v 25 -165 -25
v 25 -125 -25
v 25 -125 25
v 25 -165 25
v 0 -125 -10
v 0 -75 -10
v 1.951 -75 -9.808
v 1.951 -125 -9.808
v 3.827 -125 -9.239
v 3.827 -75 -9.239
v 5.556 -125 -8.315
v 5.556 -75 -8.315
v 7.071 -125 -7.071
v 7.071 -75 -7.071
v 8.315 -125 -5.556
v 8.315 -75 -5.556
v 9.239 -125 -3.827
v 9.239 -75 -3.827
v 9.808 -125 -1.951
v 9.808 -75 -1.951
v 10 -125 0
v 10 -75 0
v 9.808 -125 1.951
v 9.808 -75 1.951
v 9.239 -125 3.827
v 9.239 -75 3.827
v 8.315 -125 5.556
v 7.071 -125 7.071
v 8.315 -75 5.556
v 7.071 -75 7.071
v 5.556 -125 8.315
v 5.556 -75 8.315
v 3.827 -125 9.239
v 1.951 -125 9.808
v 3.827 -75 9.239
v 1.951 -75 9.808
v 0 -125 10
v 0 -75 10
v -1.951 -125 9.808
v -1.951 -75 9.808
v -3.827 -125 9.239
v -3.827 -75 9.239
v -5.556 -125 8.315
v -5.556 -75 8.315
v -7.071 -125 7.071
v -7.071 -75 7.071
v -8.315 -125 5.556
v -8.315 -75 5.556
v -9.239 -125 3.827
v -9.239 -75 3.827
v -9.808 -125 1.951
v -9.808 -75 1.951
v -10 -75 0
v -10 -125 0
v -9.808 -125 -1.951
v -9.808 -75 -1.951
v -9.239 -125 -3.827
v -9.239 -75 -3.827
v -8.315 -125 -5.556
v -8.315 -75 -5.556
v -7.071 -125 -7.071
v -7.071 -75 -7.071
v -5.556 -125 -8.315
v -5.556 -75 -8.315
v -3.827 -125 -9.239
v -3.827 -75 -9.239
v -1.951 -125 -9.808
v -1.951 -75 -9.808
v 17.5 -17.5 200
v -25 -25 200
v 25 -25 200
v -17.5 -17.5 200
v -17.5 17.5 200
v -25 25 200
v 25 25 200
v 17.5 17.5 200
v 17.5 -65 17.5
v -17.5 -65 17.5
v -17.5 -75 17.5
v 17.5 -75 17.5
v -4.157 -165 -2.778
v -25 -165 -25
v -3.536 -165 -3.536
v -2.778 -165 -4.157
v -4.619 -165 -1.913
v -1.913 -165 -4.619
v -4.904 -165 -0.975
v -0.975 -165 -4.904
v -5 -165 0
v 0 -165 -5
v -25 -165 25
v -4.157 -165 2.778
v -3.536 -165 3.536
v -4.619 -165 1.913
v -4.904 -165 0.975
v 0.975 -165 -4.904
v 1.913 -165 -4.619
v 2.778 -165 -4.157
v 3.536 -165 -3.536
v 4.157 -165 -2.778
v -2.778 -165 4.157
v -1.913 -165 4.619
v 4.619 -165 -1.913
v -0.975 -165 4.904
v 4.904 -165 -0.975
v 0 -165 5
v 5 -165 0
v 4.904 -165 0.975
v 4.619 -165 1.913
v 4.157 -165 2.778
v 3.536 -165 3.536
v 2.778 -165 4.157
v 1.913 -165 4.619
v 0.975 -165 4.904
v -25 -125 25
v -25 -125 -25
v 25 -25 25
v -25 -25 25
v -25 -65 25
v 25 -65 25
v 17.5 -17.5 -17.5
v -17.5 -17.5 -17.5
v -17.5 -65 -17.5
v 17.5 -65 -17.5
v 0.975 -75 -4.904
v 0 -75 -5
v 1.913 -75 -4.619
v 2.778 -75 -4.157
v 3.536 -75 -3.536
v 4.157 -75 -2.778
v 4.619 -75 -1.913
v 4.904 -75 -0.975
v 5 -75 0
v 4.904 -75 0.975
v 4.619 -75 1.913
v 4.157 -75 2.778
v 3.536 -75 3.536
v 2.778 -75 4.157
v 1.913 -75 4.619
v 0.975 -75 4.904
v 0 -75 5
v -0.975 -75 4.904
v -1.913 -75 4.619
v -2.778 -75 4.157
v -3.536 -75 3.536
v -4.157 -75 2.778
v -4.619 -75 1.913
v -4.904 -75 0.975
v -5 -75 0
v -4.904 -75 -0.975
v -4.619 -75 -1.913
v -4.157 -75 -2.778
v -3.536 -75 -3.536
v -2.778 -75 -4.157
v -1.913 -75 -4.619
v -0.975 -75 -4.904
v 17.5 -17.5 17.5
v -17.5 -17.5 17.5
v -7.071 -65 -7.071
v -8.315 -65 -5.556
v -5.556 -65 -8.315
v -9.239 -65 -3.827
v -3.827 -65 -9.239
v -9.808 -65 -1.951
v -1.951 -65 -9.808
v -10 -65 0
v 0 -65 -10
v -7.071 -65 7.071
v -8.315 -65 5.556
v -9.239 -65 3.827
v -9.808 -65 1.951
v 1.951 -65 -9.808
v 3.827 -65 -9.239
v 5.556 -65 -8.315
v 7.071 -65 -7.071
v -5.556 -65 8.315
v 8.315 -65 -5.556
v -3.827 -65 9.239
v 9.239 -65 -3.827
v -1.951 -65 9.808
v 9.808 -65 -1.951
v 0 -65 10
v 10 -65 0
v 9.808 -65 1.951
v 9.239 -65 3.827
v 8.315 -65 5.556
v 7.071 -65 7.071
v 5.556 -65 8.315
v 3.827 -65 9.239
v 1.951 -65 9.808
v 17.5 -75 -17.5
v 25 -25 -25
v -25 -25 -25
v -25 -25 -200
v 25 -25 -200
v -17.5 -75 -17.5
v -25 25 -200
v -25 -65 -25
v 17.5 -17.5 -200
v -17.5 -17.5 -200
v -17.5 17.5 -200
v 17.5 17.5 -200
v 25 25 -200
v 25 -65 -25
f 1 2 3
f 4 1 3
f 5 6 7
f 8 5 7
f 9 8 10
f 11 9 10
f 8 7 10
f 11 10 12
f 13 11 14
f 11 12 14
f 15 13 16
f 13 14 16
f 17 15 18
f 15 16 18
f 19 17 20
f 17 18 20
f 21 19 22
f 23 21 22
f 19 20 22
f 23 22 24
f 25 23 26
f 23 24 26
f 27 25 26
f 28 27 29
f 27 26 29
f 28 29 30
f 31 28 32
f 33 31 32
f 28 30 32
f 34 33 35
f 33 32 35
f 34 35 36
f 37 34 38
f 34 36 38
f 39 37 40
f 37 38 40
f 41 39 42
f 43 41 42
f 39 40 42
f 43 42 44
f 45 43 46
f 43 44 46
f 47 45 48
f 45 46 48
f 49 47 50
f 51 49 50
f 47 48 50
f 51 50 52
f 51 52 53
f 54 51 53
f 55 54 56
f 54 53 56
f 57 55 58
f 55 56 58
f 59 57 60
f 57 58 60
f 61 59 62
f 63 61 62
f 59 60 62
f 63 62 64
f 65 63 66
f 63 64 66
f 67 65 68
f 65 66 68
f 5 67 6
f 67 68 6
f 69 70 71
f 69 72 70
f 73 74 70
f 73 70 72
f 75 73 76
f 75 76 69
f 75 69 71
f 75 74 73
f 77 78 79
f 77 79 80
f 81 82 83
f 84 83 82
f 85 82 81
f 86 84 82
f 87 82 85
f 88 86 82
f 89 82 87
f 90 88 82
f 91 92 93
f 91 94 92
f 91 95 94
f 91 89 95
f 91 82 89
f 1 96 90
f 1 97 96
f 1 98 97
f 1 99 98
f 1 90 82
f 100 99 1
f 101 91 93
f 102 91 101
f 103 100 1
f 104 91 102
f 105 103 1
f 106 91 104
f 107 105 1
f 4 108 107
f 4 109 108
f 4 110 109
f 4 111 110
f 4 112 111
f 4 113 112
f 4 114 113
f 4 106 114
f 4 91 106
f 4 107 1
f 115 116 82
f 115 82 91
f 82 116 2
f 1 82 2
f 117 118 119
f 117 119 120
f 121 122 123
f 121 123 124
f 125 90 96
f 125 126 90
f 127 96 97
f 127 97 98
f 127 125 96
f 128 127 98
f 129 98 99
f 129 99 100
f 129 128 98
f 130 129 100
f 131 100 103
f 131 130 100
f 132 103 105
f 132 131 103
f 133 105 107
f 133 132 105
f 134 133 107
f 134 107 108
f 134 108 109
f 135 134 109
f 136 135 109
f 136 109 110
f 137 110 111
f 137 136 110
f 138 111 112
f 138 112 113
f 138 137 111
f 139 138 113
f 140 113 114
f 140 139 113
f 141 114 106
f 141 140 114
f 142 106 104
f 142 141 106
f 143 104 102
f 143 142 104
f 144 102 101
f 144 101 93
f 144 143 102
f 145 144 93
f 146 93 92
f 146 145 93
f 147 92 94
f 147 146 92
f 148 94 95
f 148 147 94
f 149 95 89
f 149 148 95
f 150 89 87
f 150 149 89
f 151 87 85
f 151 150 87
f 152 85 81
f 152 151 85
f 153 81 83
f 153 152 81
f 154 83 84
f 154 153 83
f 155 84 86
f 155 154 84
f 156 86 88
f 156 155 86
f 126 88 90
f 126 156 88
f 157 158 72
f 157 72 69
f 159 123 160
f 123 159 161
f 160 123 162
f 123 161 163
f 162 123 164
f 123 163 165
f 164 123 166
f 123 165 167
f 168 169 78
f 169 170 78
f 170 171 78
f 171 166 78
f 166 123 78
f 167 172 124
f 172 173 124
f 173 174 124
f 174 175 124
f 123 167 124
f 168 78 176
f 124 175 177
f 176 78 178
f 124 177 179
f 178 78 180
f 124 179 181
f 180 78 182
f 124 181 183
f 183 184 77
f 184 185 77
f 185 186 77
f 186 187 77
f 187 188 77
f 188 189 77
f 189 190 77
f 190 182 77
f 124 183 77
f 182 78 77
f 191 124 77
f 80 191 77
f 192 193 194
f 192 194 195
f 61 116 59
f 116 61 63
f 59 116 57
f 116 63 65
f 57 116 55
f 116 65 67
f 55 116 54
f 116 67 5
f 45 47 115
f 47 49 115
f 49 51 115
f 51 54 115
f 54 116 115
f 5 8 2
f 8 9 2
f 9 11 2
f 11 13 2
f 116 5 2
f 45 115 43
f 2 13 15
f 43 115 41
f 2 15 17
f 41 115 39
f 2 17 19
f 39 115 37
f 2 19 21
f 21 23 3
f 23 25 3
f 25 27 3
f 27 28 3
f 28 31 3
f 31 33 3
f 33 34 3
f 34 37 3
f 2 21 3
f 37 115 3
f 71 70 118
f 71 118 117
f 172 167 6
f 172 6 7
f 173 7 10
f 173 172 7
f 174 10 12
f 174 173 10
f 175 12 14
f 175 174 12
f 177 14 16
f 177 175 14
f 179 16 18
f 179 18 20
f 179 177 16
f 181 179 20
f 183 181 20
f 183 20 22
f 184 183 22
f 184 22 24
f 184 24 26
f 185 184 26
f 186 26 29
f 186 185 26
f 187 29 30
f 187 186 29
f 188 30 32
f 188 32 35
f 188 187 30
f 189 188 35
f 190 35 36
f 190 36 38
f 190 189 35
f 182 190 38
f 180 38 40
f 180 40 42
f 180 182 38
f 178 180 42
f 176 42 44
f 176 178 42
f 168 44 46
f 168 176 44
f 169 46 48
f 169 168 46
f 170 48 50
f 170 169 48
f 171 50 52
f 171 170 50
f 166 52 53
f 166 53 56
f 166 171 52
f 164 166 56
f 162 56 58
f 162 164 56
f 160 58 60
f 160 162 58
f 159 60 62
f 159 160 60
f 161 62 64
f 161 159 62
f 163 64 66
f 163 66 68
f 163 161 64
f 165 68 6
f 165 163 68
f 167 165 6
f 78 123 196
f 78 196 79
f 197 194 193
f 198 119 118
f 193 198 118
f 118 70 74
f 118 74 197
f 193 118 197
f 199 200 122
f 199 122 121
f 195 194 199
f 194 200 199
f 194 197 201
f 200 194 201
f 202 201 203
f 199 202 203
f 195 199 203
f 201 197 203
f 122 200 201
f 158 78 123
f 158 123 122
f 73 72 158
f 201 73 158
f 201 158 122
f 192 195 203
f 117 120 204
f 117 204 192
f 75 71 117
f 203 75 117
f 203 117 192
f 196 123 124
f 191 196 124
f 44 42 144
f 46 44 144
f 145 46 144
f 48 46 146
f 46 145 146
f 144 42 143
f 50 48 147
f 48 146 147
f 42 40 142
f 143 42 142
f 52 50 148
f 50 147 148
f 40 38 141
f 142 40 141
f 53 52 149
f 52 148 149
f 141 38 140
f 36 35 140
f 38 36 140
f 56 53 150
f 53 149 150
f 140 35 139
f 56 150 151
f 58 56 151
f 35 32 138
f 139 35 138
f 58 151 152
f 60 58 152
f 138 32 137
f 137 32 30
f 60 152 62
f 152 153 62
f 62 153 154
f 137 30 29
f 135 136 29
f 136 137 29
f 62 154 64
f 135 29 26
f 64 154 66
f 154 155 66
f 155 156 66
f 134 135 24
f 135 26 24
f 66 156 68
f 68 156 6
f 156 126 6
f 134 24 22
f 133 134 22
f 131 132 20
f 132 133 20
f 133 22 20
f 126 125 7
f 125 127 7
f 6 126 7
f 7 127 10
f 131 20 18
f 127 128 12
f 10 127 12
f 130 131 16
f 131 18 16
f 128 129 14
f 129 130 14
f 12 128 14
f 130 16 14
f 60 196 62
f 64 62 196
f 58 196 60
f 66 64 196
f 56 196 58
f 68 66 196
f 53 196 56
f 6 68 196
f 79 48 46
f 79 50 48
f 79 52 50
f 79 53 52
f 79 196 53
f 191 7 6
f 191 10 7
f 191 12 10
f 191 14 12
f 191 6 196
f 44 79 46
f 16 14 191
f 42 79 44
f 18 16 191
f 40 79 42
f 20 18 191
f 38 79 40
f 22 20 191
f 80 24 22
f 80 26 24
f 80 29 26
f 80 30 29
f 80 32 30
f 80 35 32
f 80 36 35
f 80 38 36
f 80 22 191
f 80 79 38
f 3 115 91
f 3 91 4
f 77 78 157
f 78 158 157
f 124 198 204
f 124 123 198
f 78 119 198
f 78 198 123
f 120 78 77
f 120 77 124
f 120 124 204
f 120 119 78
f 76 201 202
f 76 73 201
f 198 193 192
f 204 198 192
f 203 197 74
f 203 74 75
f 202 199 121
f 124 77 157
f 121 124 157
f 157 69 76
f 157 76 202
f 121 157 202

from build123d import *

# Parameters (mm, degrees)
SKETCH_1_W          = 50
SKETCH_1_H          = 50
SKETCH_1_W_2        = 35
SKETCH_1_H_2        = 35
EXTRUDE_1_DEPTH     = 200
SKETCH_2_W          = 50
SKETCH_2_H          = 50
SKETCH_2_W_2        = 35
SKETCH_2_H_2        = 35
EXTRUDE_2_DEPTH     = 40
SKETCH_3_W          = 35
SKETCH_3_H          = 35
CUT_EXTRUDE_1_DEPTH = 60
SKETCH_4_W          = 35
SKETCH_4_H          = 35
SKETCH_4_R          = 10
EXTRUDE_3_DEPTH     = 10
SKETCH_5_R          = 10
SKETCH_5_R_2        = 5
EXTRUDE_4_DEPTH     = 50
SKETCH_6_W          = 50
SKETCH_6_H          = 50
SKETCH_6_R          = 5
EXTRUDE_5_DEPTH     = 40


with BuildPart() as part:
    # Эскиз1 → Бобышка-Вытянуть1 (new, symmetric)
    with BuildSketch(Plane.XY):
        Rectangle(SKETCH_1_W, SKETCH_1_H)
        Rectangle(SKETCH_1_W_2, SKETCH_1_H_2, mode=Mode.SUBTRACT)
    extrude(amount=EXTRUDE_1_DEPTH, both=True)

    # Эскиз2 → Бобышка-Вытянуть2 (add)
    with BuildSketch(Plane.XZ.offset(25)):
        Rectangle(SKETCH_2_W, SKETCH_2_H)
        Rectangle(SKETCH_2_W_2, SKETCH_2_H_2, mode=Mode.SUBTRACT)
    extrude(amount=EXTRUDE_2_DEPTH)

    # Эскиз3 → Вырез-Вытянуть1 (cut)
    with BuildSketch(Plane.XZ.offset(65)):
        Rectangle(SKETCH_3_W, SKETCH_3_H)
    extrude(amount=-CUT_EXTRUDE_1_DEPTH, mode=Mode.SUBTRACT)


with BuildPart() as body_2:
    # Эскиз4 → Бобышка-Вытянуть3 (new body)
    with BuildSketch(Plane.XZ.offset(65)):
        Rectangle(SKETCH_4_W, SKETCH_4_H)
        with Locations(Location((0, 0, 0), (0, 0, 270))):
            Circle(SKETCH_4_R, mode=Mode.SUBTRACT)
    extrude(amount=EXTRUDE_3_DEPTH)


with BuildPart() as body_3:
    # Эскиз5 → Бобышка-Вытянуть4 (new body)
    with BuildSketch(Plane.XZ.offset(75)):
        with Locations(Location((0, 0, 0), (0, 0, 270))):
            Circle(SKETCH_5_R)
        with Locations(Location((0, 0, 0), (0, 0, 270))):
            Circle(SKETCH_5_R_2, mode=Mode.SUBTRACT)
    extrude(amount=EXTRUDE_4_DEPTH)

    # Эскиз6 → Бобышка-Вытянуть5 (add)
    with BuildSketch(Plane.XZ.offset(125)):
        Rectangle(SKETCH_6_W, SKETCH_6_H)
        with Locations(Location((0, 0, 0), (0, 0, 270))):
            Circle(SKETCH_6_R, mode=Mode.SUBTRACT)
    extrude(amount=EXTRUDE_5_DEPTH)


solid = Compound([part.part, body_2.part, body_3.part])
